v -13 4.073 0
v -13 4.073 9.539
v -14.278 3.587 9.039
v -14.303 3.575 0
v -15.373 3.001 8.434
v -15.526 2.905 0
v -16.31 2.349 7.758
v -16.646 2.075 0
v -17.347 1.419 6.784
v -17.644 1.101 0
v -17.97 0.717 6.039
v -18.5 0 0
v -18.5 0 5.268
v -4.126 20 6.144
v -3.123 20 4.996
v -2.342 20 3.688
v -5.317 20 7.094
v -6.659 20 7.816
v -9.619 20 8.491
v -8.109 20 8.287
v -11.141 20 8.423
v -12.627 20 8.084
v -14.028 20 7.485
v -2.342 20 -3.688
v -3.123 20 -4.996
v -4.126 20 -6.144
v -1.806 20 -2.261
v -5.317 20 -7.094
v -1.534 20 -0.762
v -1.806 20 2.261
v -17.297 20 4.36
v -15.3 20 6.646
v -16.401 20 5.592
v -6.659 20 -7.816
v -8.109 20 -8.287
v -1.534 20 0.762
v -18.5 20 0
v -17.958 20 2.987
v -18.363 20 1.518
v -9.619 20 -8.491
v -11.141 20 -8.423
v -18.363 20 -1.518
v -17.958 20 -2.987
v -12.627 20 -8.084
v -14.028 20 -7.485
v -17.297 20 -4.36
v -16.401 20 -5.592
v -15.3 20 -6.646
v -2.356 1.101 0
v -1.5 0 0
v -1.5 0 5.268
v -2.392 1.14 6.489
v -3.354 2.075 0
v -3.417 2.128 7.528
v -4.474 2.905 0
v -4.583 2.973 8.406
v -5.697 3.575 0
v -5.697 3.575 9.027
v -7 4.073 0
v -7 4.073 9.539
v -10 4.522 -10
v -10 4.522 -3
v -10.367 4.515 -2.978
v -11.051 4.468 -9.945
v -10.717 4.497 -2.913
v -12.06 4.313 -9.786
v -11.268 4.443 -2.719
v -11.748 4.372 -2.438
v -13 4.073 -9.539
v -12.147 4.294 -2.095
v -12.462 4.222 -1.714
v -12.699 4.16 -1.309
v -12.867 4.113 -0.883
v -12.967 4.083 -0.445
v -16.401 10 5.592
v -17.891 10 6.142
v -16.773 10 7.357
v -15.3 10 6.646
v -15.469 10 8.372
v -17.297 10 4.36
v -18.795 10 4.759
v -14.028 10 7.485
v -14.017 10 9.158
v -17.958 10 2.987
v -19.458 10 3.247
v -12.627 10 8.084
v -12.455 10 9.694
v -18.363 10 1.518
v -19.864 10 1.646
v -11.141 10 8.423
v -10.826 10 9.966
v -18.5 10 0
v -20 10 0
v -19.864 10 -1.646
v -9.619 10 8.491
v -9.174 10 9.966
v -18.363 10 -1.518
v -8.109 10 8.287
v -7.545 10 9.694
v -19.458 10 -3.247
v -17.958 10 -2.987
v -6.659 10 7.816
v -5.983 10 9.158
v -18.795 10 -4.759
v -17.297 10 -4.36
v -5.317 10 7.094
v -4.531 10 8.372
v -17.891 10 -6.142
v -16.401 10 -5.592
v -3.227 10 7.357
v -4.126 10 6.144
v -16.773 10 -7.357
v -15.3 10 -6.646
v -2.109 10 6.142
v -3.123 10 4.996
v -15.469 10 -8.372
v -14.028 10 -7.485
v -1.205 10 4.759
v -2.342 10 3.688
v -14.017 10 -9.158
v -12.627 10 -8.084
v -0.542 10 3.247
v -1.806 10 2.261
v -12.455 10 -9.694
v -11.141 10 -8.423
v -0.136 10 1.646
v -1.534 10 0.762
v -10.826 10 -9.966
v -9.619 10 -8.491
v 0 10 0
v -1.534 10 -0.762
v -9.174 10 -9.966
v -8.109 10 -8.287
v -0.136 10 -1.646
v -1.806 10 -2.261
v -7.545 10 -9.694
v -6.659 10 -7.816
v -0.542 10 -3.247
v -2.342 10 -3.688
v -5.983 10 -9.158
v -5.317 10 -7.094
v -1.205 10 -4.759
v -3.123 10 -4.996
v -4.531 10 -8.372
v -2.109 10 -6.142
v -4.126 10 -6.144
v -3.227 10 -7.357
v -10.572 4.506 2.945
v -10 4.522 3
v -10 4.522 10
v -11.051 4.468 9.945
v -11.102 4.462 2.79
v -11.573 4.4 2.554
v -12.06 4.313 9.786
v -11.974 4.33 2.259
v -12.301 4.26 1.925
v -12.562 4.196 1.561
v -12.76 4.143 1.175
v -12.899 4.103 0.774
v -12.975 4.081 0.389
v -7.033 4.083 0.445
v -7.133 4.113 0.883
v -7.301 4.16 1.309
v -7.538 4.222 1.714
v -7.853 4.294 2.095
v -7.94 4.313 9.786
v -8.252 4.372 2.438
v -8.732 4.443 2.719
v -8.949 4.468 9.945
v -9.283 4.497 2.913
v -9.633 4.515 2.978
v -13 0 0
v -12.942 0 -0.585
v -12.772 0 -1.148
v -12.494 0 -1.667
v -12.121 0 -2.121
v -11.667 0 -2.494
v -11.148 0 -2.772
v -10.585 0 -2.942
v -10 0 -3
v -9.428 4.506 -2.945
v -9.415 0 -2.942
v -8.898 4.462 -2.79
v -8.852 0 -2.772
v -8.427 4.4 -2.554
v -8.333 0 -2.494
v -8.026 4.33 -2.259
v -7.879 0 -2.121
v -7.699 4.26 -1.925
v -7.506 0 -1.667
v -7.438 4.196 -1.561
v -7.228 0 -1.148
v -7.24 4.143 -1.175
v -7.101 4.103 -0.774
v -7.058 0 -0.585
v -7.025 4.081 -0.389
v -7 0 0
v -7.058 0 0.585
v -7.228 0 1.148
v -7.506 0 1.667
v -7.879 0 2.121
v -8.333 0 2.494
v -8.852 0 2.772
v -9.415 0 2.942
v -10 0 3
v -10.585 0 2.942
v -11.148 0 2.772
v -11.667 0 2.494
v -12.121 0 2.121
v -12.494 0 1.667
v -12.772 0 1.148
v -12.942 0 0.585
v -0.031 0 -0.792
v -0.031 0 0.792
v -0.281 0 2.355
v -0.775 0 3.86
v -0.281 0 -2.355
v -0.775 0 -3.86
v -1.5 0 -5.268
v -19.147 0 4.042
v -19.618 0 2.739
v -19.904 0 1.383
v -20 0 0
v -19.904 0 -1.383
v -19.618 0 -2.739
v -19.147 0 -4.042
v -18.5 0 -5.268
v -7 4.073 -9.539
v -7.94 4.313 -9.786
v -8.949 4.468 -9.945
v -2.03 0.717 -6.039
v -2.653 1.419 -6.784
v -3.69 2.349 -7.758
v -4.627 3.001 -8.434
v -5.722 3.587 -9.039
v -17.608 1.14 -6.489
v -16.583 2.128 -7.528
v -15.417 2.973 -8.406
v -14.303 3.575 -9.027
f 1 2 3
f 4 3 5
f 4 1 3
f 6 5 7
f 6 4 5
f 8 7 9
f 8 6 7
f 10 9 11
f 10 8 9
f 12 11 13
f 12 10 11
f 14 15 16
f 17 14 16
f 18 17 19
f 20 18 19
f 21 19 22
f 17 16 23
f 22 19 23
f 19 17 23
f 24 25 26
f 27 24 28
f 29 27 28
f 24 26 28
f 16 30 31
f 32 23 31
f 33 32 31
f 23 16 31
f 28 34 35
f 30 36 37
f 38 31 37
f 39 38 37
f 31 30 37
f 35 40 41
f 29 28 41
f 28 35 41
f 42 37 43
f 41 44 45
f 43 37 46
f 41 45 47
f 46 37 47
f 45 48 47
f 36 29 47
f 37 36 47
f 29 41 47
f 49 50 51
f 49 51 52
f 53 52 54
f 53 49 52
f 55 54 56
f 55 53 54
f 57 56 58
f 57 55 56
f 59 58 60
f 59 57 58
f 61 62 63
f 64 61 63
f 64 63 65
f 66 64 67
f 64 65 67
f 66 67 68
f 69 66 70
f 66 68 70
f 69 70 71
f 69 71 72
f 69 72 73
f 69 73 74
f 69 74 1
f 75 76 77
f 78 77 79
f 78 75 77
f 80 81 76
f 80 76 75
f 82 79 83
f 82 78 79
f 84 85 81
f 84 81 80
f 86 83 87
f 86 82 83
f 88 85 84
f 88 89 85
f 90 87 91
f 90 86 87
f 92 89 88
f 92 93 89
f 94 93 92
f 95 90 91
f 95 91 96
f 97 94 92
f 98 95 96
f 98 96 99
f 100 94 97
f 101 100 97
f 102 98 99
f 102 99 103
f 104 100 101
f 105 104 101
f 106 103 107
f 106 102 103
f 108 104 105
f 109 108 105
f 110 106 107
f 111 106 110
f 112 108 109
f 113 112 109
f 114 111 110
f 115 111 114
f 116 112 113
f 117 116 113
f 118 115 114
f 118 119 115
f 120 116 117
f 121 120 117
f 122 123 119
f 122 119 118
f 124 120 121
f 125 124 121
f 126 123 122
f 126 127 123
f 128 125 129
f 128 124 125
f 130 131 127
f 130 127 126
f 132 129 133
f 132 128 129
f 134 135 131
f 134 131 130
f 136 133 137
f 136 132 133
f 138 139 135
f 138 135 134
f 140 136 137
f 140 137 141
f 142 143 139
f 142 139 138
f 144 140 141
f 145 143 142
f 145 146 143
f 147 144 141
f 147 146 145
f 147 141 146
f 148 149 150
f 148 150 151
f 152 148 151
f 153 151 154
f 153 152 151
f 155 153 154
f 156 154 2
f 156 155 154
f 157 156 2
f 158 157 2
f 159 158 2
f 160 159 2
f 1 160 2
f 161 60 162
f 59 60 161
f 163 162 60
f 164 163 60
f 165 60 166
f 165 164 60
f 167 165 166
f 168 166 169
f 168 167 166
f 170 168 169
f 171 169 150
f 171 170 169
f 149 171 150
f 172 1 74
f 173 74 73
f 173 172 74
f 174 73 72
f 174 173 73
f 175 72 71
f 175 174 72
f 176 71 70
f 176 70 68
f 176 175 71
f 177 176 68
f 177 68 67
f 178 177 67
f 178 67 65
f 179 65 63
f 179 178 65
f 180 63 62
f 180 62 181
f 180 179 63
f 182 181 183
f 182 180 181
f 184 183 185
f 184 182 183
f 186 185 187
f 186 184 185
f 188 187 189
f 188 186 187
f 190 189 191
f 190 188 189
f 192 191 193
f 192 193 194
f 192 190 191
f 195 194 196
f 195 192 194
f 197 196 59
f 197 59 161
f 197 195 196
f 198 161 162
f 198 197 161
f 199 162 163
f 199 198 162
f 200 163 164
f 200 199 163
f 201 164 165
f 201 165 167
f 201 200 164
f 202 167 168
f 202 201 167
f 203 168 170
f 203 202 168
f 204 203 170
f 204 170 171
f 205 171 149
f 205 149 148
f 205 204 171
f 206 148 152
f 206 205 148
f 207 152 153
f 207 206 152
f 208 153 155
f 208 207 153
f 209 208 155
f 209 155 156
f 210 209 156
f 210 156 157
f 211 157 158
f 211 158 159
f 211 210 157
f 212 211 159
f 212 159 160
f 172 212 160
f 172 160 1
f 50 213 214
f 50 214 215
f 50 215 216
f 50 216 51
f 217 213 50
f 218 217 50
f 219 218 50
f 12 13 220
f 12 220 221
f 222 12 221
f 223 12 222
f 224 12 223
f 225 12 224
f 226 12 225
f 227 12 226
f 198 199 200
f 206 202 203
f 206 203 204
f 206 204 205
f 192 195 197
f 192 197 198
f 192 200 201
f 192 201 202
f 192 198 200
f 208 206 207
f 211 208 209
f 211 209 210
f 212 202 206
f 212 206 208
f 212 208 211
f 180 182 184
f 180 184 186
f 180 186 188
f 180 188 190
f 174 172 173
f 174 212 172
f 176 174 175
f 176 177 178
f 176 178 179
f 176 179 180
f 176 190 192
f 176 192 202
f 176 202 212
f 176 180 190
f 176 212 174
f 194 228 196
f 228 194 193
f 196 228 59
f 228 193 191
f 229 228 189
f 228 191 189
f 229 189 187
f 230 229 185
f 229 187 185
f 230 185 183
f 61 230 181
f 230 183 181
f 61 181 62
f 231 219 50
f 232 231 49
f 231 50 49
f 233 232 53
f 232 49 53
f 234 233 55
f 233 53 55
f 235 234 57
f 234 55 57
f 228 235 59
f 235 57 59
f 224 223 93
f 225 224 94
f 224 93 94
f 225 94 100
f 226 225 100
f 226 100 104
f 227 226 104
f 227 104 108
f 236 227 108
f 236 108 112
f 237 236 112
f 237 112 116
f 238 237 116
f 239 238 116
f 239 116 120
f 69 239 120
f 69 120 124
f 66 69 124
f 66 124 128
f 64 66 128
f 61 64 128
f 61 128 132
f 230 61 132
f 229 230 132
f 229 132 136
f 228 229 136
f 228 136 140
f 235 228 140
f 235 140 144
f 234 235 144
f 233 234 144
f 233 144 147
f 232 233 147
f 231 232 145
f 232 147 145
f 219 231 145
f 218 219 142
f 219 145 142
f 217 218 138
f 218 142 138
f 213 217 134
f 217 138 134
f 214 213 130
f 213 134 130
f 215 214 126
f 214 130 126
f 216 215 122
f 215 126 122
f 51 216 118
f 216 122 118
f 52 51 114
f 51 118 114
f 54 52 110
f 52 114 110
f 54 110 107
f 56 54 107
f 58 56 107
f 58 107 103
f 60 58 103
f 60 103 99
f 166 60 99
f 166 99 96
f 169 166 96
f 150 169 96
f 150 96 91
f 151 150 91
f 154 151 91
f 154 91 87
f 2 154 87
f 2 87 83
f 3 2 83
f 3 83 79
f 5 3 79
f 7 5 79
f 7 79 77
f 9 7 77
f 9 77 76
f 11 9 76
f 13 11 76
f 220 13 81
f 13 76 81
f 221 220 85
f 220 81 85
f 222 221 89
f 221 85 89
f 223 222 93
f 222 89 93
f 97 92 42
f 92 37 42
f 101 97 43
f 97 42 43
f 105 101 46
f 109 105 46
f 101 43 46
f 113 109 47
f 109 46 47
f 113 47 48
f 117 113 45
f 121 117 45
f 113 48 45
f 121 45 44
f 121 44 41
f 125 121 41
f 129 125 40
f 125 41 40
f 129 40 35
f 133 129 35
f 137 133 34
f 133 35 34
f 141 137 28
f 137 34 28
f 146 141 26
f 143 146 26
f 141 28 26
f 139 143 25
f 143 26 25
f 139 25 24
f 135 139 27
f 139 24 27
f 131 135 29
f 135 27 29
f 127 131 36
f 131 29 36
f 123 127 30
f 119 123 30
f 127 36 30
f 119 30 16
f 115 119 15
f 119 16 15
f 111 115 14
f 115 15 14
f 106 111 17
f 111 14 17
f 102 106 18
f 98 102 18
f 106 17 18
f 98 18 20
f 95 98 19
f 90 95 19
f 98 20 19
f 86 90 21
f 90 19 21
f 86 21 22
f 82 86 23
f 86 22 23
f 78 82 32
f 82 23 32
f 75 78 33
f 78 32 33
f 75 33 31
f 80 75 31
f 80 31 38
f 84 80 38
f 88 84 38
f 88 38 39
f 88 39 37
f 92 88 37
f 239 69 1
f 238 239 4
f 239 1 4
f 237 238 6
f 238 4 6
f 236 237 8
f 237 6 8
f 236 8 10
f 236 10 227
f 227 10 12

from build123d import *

# Parameters (mm, degrees)
F0_W          = 1.5
F0_H          = 10
F0_W_2        = 8.5
F2_DEPTH      = 25
F2_DEPTH_BACK = 25


with BuildPart() as f1:
    # F0 (on Top) → F1 (revolve)
    with BuildSketch(Plane.XY):
        with BuildLine():
            Line((-10, 10), (-18.5, 10))
            Line((-18.5, 10), (-18.5, 0))
            ThreePointArc((-18.5, 0), (-16.099974277, 2.509062325), (-13, 4.0729282733))
            Line((-13, 4.0729282733), (-13, 4.5217803813))
            Line((-13, 4.5217803813), (-10, 4.5217803813))
            Line((-10, 4.5217803813), (-10, 10))
        make_face()
        with Locations((-19.25, 5)):
            Rectangle(F0_W, F0_H)
        with Locations((-14.25, 15)):
            Rectangle(F0_W_2, F0_H)
        with BuildLine():
            ThreePointArc((-13, 4.0729282733), (-11.516696098, 4.4089463041), (-10, 4.5217803813))
            Line((-10, 4.5217803813), (-13, 4.5217803813))
            Line((-13, 4.5217803813), (-13, 4.0729282733))
        make_face()
        with BuildLine():
            Line((-10, 0), (-10, 4.5217803813))
            ThreePointArc((-10, 4.5217803813), (-11.516696098, 4.4089463041), (-13, 4.0729282733))
            Line((-13, 4.0729282733), (-13, 0))
            Line((-13, 0), (-10, 0))
        make_face()
        with BuildLine():
            ThreePointArc((-13, 4.0729282733), (-16.099974277, 2.509062325), (-18.5, 0))
            Line((-18.5, 0), (-13, 0))
            Line((-13, 0), (-13, 4.0729282733))
        make_face()
    revolve(axis=Axis((-10, 10, 0), (0, -1, 0)))

    # F0 (on Top) → F2 (cut, two sides)
    with BuildSketch(Plane.XY) as f2_sk:
        with BuildLine():
            ThreePointArc((-13, 4.0729282733), (-16.099974277, 2.509062325), (-18.5, 0))
            Line((-18.5, 0), (-13, 0))
            Line((-13, 0), (-13, 4.0729282733))
        make_face()
        with BuildLine():
            Line((-7, 0), (-1.5, 0))
            ThreePointArc((-1.5, 0), (-3.900025723, 2.509062325), (-7, 4.0729282733))
            Line((-7, 4.0729282733), (-7, 0))
        make_face()
        with BuildLine():
            Line((-10, 0), (-10, 4.5217803813))
            ThreePointArc((-10, 4.5217803813), (-11.516696098, 4.4089463041), (-13, 4.0729282733))
            Line((-13, 4.0729282733), (-13, 0))
            Line((-13, 0), (-10, 0))
        make_face()
        with BuildLine():
            ThreePointArc((-7, 4.0729282733), (-8.483303902, 4.4089463041), (-10, 4.5217803813))
            Line((-10, 4.5217803813), (-10, 0))
            Line((-10, 0), (-7, 0))
            Line((-7, 0), (-7, 4.0729282733))
        make_face()
    extrude(amount=F2_DEPTH, mode=Mode.SUBTRACT)
    extrude(f2_sk.sketch, amount=-F2_DEPTH_BACK, mode=Mode.SUBTRACT)

    # F0 (on Top) → F3 (revolve)
    with BuildSketch(Plane.XY):
        with BuildLine():
            Line((-10, 0), (-10, 4.5217803813))
            ThreePointArc((-10, 4.5217803813), (-11.516696098, 4.4089463041), (-13, 4.0729282733))
            Line((-13, 4.0729282733), (-13, 0))
            Line((-13, 0), (-10, 0))
        make_face()
        with BuildLine():
            ThreePointArc((-13, 4.0729282733), (-11.516696098, 4.4089463041), (-10, 4.5217803813))
            Line((-10, 4.5217803813), (-13, 4.5217803813))
            Line((-13, 4.5217803813), (-13, 4.0729282733))
        make_face()
    revolve(axis=Axis((-10, 10, 0), (0, -1, 0)))


solid = f1.part
